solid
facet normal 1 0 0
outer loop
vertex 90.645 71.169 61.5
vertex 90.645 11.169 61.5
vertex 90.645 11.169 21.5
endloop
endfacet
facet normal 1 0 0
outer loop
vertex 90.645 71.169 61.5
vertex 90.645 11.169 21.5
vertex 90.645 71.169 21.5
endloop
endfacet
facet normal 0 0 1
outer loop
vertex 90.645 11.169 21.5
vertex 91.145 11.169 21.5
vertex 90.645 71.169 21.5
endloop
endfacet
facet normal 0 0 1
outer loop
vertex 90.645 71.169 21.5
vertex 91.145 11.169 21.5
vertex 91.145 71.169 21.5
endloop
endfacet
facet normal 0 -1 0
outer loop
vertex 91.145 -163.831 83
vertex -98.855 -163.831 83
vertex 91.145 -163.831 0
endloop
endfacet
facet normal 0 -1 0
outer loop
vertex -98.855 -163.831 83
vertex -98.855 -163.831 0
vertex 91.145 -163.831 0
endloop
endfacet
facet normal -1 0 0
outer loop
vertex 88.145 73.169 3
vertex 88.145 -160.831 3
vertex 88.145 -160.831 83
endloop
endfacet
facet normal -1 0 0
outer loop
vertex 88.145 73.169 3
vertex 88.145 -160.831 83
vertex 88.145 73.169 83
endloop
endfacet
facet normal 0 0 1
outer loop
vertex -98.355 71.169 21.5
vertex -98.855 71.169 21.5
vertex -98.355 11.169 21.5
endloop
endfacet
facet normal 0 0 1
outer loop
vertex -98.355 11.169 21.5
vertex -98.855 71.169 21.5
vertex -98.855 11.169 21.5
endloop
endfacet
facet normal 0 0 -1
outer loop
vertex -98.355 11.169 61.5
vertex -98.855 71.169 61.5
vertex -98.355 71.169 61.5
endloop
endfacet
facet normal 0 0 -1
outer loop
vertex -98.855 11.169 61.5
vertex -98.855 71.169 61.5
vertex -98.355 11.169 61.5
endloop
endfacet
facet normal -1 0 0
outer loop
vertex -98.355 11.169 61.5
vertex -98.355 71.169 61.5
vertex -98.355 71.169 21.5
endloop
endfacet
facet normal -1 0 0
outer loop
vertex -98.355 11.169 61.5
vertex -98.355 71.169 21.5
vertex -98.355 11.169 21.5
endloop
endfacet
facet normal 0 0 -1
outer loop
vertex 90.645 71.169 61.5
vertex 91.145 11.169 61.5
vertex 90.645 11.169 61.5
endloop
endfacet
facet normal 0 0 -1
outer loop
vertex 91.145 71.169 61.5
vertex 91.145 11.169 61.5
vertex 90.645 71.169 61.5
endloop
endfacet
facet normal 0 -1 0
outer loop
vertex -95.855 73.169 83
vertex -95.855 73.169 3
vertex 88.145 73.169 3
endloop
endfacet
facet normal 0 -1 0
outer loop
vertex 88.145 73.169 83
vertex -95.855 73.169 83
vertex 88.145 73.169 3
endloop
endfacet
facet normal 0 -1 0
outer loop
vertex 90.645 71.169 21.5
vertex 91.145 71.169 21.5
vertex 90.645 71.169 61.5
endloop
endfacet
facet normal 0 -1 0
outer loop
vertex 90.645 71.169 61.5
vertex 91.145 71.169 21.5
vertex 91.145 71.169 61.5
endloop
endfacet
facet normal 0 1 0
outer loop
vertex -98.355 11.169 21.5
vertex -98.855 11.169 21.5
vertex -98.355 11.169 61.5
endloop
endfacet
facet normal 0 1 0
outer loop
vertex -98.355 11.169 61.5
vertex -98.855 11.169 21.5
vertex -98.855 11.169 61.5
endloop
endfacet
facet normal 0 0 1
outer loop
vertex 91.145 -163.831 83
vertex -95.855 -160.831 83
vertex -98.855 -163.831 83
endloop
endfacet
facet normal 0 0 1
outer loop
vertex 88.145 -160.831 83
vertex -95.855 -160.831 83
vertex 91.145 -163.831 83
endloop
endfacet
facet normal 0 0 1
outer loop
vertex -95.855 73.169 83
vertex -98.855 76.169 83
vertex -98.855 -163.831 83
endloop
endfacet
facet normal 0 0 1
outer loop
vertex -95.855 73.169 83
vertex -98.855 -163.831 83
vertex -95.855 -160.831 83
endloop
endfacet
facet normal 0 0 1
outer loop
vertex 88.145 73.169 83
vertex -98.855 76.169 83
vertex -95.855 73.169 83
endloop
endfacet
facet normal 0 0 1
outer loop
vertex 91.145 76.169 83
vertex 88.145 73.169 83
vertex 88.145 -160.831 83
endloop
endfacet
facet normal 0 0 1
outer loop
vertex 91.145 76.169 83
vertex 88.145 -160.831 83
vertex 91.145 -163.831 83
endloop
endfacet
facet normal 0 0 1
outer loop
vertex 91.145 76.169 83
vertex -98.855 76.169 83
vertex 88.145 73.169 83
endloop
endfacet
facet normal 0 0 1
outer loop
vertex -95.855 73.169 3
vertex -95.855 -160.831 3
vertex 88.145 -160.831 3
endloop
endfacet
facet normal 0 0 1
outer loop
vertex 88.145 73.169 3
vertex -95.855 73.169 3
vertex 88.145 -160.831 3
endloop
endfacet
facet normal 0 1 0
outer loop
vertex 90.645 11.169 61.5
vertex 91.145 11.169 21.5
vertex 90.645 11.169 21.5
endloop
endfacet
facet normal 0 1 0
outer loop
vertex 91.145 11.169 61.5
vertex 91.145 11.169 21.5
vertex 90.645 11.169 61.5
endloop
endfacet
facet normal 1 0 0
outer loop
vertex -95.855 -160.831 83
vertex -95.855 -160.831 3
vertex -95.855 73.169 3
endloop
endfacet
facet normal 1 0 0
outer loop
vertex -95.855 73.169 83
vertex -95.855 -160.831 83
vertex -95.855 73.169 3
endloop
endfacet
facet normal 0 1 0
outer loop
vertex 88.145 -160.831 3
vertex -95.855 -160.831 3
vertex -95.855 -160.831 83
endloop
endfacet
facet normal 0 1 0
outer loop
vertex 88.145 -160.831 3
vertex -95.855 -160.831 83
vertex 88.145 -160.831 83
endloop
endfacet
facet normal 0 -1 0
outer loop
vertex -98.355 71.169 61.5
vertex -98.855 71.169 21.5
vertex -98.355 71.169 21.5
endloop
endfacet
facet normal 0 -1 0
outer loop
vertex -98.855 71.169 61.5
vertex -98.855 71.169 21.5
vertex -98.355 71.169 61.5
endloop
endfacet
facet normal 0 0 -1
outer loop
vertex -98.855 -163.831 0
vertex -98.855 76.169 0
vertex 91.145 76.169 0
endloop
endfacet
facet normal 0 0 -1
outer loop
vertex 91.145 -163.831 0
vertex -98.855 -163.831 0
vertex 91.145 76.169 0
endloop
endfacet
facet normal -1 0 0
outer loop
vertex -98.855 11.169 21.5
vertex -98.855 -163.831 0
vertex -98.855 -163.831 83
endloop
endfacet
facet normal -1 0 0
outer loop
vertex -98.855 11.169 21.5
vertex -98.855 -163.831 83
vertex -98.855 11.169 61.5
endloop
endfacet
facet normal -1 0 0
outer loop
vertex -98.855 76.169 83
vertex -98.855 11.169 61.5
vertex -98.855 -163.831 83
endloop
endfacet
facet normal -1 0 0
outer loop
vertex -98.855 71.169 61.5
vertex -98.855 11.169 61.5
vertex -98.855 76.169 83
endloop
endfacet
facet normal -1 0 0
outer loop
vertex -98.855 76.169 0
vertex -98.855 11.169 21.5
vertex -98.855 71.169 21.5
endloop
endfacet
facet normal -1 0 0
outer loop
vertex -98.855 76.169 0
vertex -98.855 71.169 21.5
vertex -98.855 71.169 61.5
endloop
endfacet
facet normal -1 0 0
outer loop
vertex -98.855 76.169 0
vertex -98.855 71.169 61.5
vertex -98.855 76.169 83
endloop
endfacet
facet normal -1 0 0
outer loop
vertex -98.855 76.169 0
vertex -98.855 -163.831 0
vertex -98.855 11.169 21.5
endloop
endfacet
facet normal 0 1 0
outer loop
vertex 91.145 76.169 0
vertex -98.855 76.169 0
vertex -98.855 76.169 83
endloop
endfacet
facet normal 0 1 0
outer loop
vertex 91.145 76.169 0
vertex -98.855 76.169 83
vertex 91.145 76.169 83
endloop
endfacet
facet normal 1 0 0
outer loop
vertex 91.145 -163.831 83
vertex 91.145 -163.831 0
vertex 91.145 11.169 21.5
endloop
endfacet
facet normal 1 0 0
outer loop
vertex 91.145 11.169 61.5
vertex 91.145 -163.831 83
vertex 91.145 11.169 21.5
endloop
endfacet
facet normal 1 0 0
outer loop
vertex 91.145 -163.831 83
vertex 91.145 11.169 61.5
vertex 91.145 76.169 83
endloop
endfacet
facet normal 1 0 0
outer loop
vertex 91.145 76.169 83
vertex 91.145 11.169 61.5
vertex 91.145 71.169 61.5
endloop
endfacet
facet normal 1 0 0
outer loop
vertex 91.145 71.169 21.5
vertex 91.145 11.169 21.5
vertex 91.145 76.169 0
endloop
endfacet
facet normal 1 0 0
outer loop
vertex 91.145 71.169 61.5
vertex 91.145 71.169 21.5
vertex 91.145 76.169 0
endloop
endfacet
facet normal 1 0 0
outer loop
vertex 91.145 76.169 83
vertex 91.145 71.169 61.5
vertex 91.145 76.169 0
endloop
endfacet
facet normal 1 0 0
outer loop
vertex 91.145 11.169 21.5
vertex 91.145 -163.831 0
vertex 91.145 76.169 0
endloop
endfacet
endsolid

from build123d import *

# Parameters (mm, degrees)
F0_W     = 190
F0_H     = 240
F1_DEPTH = 3
F2_W     = 190
F2_H     = 240
F2_W_2   = 184
F2_H_2   = 234
F3_DEPTH = 80
F4_W     = 60
F4_H     = 40
F5_DEPTH = 0.5
F6_W     = 60
F6_H     = 40
F7_DEPTH = 0.5


with BuildPart() as f1:
    # F0 (on Top) → F1 (new body)
    with BuildSketch(Plane.XY):
        with Locations((-3.855437, -43.830654)):
            Rectangle(F0_W, F0_H)
    extrude(amount=F1_DEPTH)

    # F2 (on face) → F3 (join)
    with BuildSketch(Plane.XY.offset(3)):
        with Locations((-3.855437, -43.830654)):
            Rectangle(F2_W, F2_H)
        with Locations((-3.855437, -43.830654)):
            Rectangle(F2_W_2, F2_H_2, mode=Mode.SUBTRACT)
    extrude(amount=F3_DEPTH)

    # F4 (on face) → F5 (cut)
    with BuildSketch(Plane(origin=(-98.855437, 0, 0), x_dir=(0, -1, 0), z_dir=(-1, 0, 0))):
        with Locations((-41.169346, 41.5)):
            Rectangle(F4_W, F4_H)
    extrude(amount=-F5_DEPTH, mode=Mode.SUBTRACT)

    # F6 (on face) → F7 (cut)
    with BuildSketch(Plane.YZ.offset(91.144563)):
        with Locations((41.169346, 41.5)):
            Rectangle(F6_W, F6_H)
    extrude(amount=-F7_DEPTH, mode=Mode.SUBTRACT)


solid = f1.part
